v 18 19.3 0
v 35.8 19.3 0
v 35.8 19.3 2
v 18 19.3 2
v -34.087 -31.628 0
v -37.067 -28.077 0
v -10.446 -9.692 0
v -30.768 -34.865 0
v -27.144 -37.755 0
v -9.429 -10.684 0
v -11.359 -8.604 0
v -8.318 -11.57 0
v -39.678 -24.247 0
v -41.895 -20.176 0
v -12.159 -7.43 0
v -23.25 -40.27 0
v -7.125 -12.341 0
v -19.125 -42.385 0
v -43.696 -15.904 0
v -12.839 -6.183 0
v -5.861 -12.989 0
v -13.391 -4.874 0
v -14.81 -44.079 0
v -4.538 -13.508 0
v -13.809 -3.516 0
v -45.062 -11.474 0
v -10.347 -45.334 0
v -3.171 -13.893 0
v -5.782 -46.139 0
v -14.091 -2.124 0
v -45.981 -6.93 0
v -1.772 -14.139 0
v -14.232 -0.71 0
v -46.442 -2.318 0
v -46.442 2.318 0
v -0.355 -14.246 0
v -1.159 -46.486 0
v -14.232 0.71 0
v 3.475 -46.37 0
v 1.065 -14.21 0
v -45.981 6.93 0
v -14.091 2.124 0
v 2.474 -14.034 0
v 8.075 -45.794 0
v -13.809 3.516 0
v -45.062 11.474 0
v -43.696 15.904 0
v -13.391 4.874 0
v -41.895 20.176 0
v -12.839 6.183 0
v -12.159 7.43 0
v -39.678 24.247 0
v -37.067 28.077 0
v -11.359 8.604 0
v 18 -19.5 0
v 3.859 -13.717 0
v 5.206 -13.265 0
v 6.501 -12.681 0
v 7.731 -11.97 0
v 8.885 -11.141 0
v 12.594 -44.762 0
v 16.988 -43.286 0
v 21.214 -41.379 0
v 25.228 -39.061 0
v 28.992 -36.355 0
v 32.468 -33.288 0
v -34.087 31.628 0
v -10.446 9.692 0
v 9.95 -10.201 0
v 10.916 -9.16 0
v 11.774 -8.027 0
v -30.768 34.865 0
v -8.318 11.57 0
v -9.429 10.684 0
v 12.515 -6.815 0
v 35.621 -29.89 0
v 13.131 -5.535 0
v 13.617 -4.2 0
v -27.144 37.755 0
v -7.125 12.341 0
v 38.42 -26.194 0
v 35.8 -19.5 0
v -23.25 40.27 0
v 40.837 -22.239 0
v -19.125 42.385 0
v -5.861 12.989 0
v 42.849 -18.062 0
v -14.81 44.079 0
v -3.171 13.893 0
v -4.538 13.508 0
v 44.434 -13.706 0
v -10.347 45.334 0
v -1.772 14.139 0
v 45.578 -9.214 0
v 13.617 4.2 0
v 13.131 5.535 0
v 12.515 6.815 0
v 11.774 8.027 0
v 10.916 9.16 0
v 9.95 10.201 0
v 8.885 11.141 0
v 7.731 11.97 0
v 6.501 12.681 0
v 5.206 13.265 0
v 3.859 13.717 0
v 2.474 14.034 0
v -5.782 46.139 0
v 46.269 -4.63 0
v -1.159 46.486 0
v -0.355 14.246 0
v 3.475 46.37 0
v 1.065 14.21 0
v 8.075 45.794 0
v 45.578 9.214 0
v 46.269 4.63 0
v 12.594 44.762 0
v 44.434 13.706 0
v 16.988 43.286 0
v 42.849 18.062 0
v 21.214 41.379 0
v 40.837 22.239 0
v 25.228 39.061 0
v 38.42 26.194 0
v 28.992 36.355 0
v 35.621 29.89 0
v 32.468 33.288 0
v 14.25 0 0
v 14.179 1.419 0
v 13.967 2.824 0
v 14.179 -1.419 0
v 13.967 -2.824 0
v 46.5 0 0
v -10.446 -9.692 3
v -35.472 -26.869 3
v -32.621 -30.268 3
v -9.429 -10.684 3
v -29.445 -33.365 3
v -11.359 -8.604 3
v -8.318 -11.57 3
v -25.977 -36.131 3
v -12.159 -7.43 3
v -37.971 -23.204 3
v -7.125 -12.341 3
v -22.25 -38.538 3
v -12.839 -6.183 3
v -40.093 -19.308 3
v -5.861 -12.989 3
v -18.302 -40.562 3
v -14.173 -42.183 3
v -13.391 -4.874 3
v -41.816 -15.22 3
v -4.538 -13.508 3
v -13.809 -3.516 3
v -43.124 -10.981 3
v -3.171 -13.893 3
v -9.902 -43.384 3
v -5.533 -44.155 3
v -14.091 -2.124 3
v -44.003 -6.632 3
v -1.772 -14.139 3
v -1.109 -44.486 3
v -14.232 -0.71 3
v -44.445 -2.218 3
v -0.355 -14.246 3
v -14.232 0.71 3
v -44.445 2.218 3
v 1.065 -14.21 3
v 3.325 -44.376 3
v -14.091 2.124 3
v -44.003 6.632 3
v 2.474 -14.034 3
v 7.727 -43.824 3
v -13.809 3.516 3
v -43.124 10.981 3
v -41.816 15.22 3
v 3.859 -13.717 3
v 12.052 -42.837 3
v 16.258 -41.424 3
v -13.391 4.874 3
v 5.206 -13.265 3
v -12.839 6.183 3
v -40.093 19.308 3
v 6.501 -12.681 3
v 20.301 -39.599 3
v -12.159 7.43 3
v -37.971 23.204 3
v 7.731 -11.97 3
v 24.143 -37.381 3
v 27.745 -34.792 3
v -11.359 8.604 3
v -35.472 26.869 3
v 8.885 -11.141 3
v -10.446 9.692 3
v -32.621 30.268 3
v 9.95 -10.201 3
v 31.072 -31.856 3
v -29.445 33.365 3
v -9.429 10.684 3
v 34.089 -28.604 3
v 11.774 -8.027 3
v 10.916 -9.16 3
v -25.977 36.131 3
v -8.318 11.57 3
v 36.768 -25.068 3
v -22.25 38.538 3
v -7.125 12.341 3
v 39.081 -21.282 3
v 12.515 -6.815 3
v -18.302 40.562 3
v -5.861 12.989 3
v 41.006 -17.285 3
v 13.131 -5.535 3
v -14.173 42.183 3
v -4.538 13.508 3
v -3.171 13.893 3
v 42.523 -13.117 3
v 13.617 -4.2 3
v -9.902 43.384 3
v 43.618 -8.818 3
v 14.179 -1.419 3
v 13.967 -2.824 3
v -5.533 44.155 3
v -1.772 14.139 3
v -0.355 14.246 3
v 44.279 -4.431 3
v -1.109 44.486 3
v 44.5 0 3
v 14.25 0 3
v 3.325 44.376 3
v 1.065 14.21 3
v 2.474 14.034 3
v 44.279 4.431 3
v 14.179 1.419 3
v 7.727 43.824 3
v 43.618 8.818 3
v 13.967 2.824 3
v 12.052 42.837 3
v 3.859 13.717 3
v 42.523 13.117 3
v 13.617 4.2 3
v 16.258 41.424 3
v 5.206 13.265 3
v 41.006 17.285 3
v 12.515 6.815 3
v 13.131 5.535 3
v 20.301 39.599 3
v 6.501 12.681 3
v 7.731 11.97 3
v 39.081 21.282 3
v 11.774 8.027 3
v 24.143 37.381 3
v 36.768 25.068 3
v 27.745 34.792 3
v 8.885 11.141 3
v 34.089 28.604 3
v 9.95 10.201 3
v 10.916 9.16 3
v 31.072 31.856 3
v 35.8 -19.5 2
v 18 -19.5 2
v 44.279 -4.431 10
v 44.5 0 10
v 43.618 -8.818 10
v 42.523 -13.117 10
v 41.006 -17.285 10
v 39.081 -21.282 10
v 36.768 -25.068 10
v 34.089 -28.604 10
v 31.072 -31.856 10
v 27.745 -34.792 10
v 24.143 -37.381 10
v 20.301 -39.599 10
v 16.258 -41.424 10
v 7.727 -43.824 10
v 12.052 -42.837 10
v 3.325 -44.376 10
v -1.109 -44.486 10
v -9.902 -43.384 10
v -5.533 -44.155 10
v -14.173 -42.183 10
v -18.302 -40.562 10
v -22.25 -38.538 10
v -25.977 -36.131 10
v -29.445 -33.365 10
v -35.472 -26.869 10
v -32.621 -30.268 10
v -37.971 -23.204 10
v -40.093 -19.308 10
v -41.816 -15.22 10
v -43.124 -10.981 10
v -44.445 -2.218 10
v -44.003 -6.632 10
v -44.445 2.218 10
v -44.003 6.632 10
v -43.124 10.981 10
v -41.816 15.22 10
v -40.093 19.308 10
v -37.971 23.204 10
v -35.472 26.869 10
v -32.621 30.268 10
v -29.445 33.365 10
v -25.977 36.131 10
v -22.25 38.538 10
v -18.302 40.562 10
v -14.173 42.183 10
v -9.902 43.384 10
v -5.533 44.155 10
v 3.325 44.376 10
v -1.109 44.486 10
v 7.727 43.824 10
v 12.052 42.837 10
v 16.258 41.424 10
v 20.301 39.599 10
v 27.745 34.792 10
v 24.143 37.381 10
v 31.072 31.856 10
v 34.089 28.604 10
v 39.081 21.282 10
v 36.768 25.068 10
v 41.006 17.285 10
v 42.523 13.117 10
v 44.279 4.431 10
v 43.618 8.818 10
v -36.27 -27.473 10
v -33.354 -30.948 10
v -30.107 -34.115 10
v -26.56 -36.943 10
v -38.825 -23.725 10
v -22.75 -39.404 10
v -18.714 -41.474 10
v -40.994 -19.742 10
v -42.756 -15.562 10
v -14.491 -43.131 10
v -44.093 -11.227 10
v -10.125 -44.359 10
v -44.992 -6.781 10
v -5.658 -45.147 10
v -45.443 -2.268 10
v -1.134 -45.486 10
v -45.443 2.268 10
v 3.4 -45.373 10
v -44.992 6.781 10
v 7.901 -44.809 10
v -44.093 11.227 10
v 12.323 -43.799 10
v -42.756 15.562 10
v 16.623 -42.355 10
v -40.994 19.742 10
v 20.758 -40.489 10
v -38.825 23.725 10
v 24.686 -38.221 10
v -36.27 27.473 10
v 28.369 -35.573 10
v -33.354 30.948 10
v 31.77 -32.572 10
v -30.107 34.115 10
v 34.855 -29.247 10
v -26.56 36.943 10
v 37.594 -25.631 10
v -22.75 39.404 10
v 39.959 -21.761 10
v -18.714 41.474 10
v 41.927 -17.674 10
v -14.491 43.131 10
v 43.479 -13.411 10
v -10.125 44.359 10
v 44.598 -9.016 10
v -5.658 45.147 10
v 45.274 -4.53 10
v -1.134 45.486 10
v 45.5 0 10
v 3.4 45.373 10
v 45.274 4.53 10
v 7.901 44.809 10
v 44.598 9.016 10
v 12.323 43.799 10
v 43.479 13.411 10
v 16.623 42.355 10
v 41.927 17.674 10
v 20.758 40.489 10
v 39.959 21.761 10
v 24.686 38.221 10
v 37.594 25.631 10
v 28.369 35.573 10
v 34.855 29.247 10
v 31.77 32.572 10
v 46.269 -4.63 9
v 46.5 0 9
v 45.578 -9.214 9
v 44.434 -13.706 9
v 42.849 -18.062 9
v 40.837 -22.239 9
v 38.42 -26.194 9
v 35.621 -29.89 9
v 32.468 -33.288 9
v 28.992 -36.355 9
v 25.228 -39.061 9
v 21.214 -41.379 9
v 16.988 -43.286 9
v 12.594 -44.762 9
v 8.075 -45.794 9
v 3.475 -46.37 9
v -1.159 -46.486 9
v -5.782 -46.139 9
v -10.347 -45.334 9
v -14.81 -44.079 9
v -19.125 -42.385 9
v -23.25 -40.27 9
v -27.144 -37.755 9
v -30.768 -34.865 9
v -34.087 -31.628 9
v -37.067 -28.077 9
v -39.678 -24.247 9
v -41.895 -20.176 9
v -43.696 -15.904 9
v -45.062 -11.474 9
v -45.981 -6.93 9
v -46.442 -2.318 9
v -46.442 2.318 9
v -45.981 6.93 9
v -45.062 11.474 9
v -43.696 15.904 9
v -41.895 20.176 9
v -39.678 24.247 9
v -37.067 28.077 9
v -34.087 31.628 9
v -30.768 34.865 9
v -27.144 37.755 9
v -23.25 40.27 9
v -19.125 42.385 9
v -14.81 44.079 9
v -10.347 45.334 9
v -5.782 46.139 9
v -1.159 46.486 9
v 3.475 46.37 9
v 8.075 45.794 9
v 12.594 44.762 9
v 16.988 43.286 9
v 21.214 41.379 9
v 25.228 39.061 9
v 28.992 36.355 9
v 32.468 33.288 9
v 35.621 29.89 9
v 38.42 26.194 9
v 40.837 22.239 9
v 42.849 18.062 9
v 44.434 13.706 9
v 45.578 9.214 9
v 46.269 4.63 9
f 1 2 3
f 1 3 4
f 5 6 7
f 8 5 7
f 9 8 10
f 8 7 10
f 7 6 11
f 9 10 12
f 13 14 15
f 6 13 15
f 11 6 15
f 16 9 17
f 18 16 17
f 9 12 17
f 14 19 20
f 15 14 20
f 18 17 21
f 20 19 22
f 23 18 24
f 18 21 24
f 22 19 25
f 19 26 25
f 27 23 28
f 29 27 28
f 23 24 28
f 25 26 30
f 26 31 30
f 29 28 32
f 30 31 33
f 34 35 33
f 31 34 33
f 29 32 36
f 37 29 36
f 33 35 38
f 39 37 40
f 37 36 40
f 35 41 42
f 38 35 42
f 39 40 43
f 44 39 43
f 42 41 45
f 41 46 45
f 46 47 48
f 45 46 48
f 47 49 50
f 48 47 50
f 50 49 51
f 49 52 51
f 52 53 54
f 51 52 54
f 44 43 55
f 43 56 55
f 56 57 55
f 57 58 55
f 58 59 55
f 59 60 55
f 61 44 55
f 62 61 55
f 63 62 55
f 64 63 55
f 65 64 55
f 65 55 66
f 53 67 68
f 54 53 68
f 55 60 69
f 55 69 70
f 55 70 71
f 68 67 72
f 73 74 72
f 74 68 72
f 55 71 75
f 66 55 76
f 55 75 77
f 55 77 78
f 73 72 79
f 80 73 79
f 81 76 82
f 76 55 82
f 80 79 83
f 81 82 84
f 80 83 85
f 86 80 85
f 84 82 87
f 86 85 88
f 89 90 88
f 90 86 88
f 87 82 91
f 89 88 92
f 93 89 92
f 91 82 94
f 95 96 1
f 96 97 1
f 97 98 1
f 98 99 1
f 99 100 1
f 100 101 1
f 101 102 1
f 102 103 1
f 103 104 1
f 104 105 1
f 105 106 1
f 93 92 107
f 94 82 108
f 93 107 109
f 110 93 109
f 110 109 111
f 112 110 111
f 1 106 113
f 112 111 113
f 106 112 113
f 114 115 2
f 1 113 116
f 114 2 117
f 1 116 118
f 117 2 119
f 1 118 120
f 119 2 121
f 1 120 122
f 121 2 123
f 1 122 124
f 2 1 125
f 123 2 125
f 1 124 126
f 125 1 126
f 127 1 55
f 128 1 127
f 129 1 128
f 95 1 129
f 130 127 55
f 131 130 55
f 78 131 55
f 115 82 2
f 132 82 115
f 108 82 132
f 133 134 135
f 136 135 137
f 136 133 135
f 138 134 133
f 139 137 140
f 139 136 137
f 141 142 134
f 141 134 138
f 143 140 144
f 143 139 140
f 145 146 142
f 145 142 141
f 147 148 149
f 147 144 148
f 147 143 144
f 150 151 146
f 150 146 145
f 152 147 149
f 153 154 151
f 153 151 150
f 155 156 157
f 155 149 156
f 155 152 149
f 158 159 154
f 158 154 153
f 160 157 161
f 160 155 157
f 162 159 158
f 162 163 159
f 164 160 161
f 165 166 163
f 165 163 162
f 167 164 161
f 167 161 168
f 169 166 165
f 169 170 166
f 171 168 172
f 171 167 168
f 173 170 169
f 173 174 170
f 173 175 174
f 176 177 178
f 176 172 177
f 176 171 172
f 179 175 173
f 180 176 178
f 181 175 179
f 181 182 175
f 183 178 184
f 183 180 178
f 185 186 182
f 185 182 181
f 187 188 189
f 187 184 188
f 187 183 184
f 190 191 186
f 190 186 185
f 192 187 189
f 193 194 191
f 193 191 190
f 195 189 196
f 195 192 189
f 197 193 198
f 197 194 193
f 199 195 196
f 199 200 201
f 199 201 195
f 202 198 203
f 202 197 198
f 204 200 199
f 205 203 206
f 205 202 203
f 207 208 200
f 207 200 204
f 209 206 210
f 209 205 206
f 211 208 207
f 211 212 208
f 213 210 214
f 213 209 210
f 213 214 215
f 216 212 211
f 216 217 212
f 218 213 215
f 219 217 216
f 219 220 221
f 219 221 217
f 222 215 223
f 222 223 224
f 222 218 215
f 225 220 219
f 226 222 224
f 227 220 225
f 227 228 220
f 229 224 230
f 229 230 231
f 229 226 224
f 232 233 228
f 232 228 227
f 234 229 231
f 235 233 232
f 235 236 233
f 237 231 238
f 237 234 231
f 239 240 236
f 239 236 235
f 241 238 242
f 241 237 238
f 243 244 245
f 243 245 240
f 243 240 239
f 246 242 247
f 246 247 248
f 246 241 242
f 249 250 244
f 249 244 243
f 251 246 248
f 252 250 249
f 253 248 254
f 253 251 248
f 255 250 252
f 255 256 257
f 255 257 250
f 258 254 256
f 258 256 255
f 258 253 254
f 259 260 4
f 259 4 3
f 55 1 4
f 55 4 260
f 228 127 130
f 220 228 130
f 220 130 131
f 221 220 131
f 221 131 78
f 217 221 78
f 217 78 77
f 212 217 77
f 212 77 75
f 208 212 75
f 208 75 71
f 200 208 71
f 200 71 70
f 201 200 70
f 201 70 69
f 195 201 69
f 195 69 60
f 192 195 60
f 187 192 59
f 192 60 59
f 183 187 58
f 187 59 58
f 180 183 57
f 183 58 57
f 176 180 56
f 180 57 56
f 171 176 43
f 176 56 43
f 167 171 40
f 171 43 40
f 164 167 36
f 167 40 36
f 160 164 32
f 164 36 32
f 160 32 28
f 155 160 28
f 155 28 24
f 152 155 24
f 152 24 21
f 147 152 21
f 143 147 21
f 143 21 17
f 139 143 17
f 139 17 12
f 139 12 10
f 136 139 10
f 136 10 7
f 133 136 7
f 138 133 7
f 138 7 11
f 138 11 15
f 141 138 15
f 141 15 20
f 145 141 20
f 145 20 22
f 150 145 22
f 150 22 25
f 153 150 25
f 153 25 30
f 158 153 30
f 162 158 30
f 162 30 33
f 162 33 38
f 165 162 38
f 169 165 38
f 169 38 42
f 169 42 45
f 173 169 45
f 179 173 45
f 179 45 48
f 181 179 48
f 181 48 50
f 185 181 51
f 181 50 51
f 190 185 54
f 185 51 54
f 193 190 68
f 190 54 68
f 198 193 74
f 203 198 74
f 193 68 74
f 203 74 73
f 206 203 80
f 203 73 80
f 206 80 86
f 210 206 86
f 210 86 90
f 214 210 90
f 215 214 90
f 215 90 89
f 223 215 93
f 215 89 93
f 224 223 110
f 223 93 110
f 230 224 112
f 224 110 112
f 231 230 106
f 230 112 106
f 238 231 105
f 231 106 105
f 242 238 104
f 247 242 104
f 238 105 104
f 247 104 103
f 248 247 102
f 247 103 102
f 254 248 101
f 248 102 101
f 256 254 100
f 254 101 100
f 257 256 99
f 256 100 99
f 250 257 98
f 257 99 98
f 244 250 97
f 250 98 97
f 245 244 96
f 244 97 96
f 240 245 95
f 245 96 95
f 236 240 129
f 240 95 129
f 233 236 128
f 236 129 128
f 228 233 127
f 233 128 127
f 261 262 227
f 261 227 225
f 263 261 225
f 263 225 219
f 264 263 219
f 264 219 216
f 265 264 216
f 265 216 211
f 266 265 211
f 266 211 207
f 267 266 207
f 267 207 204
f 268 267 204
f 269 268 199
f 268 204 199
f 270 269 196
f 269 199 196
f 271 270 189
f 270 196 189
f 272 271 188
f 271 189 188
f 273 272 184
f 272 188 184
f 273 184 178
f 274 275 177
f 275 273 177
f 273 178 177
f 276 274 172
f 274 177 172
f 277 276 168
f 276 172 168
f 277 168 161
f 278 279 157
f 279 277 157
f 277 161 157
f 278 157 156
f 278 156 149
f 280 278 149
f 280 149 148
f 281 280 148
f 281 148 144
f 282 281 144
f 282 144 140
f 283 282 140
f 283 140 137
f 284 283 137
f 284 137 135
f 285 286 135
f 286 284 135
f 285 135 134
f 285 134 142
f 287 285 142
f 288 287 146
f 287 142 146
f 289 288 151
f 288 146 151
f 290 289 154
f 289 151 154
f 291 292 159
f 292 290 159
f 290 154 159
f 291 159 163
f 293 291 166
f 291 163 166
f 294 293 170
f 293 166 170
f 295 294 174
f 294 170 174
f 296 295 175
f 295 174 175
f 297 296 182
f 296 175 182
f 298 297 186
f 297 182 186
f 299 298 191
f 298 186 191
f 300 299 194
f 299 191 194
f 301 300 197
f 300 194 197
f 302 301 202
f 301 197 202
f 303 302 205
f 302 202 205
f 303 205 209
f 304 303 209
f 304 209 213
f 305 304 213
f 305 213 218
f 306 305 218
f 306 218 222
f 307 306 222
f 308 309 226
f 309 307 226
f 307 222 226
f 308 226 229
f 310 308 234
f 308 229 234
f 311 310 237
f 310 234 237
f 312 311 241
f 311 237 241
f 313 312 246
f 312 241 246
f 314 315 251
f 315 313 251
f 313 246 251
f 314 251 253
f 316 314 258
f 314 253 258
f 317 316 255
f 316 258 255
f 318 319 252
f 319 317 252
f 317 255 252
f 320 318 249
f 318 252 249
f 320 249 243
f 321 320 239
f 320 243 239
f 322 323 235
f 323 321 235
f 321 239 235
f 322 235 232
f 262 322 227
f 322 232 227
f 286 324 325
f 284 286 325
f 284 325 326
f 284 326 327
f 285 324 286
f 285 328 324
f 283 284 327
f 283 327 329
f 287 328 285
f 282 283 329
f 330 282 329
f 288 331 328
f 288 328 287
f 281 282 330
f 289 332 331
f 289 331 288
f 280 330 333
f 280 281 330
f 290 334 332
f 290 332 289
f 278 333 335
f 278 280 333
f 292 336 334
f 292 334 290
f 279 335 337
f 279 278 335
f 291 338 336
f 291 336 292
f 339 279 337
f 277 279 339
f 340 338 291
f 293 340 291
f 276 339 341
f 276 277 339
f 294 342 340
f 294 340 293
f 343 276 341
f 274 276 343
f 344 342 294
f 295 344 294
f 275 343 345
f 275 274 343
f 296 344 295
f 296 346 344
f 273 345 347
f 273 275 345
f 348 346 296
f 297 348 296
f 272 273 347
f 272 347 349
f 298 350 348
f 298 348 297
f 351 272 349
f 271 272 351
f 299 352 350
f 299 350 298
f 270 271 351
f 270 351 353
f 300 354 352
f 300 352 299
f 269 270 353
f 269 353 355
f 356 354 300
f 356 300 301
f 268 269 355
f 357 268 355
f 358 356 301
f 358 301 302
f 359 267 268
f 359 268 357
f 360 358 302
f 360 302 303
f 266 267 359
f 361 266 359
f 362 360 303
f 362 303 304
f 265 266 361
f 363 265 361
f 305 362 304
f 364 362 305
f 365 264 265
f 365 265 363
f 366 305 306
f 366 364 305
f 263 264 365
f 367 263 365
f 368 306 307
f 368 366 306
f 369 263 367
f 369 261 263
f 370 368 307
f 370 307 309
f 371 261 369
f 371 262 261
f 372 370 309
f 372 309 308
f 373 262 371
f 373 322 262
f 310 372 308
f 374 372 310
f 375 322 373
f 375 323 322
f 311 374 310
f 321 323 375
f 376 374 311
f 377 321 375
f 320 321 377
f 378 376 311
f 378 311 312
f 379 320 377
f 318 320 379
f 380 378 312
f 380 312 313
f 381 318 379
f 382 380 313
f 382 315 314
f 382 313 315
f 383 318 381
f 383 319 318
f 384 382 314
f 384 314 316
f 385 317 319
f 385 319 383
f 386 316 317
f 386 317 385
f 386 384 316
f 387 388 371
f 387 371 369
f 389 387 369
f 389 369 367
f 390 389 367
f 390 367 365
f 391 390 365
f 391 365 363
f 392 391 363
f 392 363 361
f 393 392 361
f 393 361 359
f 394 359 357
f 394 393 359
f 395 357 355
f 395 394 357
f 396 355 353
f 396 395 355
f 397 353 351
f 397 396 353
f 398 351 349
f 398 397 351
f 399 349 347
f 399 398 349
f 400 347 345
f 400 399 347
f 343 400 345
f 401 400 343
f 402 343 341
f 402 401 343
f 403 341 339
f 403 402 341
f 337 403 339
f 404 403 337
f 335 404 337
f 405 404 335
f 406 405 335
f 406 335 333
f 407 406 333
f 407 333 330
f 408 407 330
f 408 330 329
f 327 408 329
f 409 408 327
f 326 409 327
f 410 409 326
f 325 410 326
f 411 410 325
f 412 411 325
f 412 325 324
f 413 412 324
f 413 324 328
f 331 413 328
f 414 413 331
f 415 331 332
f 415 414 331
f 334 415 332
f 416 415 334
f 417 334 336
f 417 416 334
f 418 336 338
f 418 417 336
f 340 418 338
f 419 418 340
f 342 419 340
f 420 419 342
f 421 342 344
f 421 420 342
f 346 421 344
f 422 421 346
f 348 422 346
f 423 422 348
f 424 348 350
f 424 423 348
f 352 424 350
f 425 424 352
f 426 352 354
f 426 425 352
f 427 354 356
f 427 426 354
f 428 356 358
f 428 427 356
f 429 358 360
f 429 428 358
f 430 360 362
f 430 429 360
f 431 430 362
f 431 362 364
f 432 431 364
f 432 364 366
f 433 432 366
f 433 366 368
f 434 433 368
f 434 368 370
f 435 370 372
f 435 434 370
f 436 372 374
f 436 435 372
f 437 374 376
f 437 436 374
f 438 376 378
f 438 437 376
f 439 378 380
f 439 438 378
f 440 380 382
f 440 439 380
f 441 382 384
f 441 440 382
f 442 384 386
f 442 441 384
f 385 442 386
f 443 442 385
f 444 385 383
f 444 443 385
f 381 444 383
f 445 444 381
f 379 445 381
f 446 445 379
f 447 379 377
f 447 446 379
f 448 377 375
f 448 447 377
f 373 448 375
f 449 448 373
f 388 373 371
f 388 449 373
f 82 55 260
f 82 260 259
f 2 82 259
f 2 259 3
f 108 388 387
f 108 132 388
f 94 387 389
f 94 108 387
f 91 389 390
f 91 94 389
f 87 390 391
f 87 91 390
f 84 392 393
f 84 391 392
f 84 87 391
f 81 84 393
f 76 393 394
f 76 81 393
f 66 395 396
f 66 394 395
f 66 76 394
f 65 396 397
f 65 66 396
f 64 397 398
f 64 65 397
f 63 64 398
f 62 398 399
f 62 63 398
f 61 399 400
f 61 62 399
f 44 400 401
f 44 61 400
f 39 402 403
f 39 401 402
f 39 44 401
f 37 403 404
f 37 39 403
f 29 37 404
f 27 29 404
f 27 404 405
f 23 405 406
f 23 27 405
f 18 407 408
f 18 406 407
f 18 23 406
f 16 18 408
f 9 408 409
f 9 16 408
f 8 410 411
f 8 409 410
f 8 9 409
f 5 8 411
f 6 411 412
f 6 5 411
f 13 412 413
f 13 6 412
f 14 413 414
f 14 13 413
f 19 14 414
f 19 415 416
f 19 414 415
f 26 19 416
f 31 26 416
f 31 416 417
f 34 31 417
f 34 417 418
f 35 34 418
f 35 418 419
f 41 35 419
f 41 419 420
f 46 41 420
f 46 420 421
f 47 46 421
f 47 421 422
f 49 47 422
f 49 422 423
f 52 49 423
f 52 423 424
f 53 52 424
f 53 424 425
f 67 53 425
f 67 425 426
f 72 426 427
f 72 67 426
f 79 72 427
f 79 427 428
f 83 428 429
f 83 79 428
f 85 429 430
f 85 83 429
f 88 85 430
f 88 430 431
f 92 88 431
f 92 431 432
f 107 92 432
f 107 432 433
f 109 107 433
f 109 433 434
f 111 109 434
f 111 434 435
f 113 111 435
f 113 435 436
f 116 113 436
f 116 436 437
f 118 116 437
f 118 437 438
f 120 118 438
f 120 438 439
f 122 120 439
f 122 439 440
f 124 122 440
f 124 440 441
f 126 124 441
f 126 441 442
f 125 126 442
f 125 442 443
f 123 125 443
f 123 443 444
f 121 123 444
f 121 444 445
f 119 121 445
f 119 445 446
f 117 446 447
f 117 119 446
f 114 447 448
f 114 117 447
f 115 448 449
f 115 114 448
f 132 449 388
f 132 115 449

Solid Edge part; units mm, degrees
sketch "Sketch1" plane through (0, 0, 0) normal (0, 0, 1) x (1, 0, 0)
  circle A0 centre (0, 0) radius 46.5
extrude "Protrusion1" add sketch "Sketch1" along normal blind 3
sketch "Sketch2" plane through (0, 0, 0) normal (0, 0, 1) x (1, 0, 0)
  circle A0 centre (0, 0) radius 46.5
  circle A1 centre (0, 0) radius 44.5
  dimension "D1" = 89
  dimension "D2" = 2
  dimension "D3" = 28.5
extrude "ExtrudedProtrusion_4" add sketch "Sketch2" along normal blind 10
sketch "Sketch3" plane through (0, 0, 0) normal (0, 0, 1) x (1, 0, 0)
  line L0 (35.8, -19.5) -> (35.8, 19.3)
  line L1 (35.8, 19.3) -> (18, 19.3)
  line L2 (18, 19.3) -> (18, -19.5)
  line L3 (18, -19.5) -> (35.8, -19.5)
extrude "ExtrudedCutout_2" cut sketch "Sketch3" along normal blind 2
sketch "Sketch4" plane through (0, 0, 0) normal (0, 0, 1) x (1, 0, 0)
  circle A0 centre (0, 0) radius 14.25
extrude "Cutout1" cut sketch "Sketch4" along normal through all
chamfer "Chamfer_1" distance 1 angle 45 1 edges at (-46.5, 0, 10) measured on face at (-31.93, 31.93, 10)
